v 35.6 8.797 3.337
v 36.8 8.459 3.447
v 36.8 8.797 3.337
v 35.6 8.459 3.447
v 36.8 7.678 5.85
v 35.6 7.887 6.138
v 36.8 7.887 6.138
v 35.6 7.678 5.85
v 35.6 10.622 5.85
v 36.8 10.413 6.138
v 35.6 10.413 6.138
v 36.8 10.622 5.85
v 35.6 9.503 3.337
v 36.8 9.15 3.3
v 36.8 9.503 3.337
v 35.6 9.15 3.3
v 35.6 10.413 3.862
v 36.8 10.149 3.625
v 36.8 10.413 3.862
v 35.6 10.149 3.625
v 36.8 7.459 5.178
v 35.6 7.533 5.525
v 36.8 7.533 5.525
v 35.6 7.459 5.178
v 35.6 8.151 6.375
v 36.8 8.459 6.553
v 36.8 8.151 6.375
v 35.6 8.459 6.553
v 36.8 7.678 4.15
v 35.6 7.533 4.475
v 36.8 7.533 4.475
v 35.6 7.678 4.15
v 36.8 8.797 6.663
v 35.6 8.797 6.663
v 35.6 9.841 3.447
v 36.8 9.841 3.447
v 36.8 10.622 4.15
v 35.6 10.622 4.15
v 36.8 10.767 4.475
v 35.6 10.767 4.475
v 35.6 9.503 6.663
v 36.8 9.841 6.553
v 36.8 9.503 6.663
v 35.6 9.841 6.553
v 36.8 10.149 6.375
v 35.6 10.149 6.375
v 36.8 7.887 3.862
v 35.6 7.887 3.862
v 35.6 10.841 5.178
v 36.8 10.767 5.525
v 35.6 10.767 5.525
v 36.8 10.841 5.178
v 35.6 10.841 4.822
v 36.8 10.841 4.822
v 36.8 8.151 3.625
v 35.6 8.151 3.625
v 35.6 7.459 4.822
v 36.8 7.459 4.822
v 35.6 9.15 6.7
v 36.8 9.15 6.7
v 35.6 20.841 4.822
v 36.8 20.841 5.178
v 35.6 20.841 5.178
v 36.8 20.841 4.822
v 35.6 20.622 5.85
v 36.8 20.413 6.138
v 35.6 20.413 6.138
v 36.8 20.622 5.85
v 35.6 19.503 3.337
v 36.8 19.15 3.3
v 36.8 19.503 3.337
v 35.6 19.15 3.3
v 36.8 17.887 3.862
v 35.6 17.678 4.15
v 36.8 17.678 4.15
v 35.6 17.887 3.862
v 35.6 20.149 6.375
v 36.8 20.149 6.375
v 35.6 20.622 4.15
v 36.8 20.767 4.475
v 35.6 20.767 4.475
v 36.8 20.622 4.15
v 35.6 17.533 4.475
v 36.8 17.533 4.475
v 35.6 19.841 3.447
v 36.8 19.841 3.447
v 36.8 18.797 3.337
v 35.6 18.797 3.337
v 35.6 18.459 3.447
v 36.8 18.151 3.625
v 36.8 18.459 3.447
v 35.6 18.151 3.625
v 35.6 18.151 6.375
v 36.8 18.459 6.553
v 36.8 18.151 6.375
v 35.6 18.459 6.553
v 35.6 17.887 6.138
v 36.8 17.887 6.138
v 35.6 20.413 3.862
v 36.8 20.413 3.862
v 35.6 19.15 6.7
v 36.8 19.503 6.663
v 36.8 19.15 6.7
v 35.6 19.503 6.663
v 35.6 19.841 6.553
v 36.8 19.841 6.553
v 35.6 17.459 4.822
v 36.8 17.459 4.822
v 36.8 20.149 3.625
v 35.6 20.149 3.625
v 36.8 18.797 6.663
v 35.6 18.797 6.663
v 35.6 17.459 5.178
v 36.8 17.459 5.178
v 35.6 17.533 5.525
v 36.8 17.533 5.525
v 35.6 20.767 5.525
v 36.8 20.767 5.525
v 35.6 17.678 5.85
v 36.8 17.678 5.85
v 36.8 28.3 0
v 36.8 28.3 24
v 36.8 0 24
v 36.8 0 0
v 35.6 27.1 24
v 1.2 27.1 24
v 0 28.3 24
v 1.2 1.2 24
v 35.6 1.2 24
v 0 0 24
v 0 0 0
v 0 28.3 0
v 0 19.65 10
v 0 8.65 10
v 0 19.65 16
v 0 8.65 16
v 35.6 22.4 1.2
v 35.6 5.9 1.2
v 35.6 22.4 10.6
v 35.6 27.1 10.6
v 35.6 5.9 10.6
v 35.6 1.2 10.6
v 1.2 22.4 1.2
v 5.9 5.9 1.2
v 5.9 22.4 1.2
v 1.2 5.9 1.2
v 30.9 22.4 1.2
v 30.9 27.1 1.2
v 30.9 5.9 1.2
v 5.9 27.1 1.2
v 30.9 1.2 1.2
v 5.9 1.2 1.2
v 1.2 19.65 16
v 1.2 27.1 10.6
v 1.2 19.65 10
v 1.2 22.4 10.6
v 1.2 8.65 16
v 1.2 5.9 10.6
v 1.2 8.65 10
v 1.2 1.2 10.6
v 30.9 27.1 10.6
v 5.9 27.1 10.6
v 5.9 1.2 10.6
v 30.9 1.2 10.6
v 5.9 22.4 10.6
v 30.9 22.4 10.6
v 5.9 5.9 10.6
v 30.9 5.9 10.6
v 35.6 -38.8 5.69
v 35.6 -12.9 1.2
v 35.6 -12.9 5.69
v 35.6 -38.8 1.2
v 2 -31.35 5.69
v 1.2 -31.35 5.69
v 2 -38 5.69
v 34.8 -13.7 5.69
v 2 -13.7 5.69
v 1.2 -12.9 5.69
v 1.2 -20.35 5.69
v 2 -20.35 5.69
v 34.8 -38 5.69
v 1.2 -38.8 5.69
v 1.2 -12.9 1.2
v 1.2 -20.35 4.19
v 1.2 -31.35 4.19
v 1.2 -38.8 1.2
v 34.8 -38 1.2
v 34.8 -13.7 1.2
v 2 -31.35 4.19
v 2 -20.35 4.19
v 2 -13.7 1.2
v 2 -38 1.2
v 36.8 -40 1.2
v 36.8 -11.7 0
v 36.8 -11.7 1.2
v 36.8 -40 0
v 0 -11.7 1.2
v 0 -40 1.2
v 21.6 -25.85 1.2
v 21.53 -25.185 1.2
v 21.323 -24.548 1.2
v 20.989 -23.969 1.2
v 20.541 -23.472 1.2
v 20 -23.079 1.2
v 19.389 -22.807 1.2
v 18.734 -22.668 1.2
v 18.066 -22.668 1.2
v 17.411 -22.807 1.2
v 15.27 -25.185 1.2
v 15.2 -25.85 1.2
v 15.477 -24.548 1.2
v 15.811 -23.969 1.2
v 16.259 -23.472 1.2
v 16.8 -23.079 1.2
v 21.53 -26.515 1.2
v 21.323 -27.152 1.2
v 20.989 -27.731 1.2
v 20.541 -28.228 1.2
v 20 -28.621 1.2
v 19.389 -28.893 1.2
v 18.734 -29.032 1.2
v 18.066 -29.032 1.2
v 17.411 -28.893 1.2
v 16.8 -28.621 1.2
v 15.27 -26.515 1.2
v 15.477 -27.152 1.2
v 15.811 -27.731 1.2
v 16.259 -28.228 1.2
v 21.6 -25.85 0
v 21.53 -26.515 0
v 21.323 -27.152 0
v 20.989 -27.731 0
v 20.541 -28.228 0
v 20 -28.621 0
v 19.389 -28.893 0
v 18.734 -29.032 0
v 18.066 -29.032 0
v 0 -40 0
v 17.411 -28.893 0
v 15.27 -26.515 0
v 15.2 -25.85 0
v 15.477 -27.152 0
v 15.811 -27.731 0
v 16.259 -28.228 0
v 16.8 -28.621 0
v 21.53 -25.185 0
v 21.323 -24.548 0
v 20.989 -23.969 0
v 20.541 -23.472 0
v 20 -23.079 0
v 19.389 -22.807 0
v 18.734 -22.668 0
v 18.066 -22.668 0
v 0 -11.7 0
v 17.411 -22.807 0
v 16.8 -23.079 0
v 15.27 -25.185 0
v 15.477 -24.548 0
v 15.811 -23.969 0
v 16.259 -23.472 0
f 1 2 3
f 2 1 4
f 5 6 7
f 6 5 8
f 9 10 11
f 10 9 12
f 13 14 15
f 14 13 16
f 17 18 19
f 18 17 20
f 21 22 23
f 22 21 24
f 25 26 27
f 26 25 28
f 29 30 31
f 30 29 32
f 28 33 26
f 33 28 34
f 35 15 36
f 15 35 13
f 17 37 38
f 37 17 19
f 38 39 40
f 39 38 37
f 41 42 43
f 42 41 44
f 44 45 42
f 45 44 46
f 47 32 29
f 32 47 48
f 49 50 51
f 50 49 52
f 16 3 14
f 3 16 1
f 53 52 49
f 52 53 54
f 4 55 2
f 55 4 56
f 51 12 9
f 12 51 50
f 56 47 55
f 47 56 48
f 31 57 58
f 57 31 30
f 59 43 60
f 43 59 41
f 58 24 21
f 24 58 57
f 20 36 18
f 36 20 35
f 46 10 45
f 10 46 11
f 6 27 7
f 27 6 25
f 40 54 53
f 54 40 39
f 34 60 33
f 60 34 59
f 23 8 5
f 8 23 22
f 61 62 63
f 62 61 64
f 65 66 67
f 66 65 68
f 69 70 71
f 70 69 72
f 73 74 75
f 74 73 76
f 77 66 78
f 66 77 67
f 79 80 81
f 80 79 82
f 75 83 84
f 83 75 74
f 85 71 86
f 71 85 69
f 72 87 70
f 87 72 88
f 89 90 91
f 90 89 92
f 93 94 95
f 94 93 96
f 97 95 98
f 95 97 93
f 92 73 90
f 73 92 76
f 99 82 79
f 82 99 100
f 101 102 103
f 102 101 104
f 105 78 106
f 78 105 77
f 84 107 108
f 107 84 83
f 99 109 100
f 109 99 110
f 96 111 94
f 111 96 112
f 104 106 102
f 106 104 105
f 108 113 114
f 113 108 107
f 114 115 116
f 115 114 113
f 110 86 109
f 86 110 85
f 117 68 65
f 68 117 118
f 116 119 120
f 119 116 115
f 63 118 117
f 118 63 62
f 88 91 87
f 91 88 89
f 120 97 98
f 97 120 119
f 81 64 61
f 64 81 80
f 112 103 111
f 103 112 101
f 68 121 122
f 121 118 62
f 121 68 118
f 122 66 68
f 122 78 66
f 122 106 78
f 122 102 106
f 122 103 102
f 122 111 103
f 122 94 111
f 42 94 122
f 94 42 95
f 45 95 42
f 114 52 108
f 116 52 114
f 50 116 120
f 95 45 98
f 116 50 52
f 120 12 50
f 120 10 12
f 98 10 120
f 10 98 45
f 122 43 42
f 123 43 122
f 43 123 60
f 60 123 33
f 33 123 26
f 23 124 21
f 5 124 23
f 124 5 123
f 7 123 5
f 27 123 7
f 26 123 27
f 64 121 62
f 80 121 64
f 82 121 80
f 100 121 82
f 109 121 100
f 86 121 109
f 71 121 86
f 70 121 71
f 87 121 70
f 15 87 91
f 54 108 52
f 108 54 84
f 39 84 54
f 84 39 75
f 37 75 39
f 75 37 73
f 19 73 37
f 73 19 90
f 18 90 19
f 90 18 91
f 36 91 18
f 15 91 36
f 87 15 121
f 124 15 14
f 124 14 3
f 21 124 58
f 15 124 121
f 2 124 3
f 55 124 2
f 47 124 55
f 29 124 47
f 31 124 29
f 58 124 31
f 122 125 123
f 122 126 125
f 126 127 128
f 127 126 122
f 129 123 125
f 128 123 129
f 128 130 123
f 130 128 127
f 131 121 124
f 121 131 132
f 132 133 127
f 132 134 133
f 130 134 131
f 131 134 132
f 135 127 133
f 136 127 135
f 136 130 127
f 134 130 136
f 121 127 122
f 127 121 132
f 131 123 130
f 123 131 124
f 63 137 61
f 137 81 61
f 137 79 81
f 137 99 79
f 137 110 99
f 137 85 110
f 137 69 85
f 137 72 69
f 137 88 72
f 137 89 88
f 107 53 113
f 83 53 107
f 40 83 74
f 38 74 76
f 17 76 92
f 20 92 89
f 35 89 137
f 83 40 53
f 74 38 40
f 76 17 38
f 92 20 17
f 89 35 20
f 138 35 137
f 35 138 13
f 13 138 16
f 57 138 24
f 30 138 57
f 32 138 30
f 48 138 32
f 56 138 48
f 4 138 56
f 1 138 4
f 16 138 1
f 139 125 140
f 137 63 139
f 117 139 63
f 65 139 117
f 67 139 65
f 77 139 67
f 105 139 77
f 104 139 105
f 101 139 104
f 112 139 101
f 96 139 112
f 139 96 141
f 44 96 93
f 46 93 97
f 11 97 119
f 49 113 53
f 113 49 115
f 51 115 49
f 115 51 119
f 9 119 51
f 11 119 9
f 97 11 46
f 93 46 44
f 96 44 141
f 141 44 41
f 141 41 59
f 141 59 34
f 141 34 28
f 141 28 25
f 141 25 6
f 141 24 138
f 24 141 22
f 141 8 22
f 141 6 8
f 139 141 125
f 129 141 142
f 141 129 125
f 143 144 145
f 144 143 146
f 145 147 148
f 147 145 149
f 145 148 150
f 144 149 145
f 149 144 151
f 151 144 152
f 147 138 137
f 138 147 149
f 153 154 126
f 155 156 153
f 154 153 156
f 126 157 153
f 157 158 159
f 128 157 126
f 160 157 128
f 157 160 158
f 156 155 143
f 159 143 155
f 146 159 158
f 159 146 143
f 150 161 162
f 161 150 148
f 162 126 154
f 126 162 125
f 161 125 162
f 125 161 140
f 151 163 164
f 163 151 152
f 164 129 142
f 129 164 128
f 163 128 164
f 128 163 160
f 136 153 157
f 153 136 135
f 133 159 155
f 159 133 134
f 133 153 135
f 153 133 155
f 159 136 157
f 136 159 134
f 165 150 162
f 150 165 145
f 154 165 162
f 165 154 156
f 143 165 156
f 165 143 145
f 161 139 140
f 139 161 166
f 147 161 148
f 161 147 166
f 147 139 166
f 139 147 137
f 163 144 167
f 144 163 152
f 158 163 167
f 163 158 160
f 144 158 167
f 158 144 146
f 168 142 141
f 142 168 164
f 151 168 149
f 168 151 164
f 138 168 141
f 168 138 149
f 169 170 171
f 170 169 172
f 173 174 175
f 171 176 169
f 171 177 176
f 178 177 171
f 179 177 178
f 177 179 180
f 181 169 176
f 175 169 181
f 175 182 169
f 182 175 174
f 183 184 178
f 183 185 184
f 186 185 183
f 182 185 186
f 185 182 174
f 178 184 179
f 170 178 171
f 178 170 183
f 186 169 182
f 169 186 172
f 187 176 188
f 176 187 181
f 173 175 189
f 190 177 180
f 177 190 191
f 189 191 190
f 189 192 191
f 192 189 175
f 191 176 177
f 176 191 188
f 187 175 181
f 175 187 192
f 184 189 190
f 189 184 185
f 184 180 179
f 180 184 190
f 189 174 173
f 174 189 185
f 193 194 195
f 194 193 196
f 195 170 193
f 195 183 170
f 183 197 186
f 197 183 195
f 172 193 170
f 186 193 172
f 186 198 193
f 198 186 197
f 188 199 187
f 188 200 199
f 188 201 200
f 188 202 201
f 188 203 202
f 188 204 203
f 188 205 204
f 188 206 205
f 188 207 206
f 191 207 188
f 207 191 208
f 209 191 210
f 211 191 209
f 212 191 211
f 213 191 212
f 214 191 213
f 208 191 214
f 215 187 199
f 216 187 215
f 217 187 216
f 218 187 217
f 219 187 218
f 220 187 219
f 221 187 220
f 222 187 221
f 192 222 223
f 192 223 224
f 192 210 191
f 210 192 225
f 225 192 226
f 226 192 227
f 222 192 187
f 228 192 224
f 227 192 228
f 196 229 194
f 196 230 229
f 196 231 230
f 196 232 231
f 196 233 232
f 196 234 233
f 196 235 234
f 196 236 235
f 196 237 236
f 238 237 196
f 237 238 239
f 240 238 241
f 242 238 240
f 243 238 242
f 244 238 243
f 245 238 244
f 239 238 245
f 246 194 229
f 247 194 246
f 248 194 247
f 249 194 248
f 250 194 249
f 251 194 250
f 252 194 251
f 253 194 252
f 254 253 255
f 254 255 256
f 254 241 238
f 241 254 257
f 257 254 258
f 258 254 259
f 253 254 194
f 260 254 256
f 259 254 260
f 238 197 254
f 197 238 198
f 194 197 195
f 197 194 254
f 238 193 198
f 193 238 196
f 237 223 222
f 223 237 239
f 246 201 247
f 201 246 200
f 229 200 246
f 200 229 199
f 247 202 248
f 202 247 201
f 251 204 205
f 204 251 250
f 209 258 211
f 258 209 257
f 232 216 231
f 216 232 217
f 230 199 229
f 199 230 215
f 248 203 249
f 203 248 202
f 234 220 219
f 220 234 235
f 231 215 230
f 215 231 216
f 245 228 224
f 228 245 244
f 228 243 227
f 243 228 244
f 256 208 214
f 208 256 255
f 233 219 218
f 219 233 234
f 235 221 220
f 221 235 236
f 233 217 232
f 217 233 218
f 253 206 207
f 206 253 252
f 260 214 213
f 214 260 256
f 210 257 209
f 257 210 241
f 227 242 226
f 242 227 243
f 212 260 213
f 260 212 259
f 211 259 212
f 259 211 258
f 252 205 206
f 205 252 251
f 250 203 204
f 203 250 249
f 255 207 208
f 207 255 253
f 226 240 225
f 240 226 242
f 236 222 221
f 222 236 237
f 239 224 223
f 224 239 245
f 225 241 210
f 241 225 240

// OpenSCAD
DEBUG = false;

pcb_size = [34.3, 25.8, 1.5];
height = 24;

antenna_conn_dia = 6.1;

space_around = 0;

pcb_hole_dia = 2.9;
pcb_hole_pos = 2;

fatness = 1.2;
inset = 0.2; // very small!

cover_fatness = 0.8;

inner_box = [pcb_size.x + 2 * space_around + inset / 2, pcb_size.y + 2 * space_around + inset / 2, height - fatness];
box = [inner_box.x + 2 * fatness, inner_box.y + 2 * fatness, inner_box.z + fatness];

echo("Inner box size ", inner_box.x, " x ", inner_box.y, " x ", inner_box.z);
echo("Box size ", box.x, " x ", box.y, " x ", box.z);

round_prec = 30;

usb_hole_size = [11, 6];
cable_hole_dia = 3.4;

column_hole_dia = 2;
column_hole_depth = 5 - pcb_size.z;
column_size = [pcb_hole_dia + 2, pcb_hole_dia + 2, 6 + column_hole_depth];

echo("Column size ", column_size.x, " x ", column_size.y, " x ", column_size.z);

// ---------------------------------------------

module Board(x, y, z) {
    translate([x, y, z]) union() {
        difference() {
            color("black") cube(pcb_size);
//            translate([pcb_hole_pos, pcb_hole_pos, - .01]) rotate([0, 0, 90])
//                cylinder(h = 10, d = pcb_hole_dia, $fn = round_prec);
//            translate([pcb_size.x - pcb_hole_pos, pcb_hole_pos, - .01]) rotate([0, 0, 90])
//                cylinder(h = 10, d = pcb_hole_dia, $fn = round_prec);
//            translate([pcb_size.x - pcb_hole_pos, pcb_size.y - pcb_hole_pos, - .01]) rotate([0, 0, 90])
//                cylinder(h = 10, d = pcb_hole_dia, $fn = round_prec);
//            translate([pcb_hole_pos, pcb_size.y - pcb_hole_pos, - .01]) rotate([0, 0, 90])
//                cylinder(h = 10, d = pcb_hole_dia, $fn = round_prec);
        }
//        color("gray") translate([4.5, 0, - 8]) difference() {
//            cube([37.5, pcb_size.y, 8]);
//            translate([- .01, 1.5, - .01]) cube([50, pcb_size.y - 2 * 1.5, 10]);
//        }
        usb_width = 7.7;
        color("red") translate([- 1, (pcb_size.y - usb_width) / 2, pcb_size.z]) cube([5, usb_width, 1]);
    }
}

module Column(x, y, z) {
    translate([x, y, z - .1]) {
        difference() {
            color("blue") cube(column_size);
//            color("red") translate([column_size.x / 2, column_size.y / 2, column_size.z - column_hole_depth]) {
//                cylinder(h = column_hole_depth + .01, d = column_hole_dia, $fn = round_prec);
//            }
        }
//        if (DEBUG) Screw(column_size.x / 2, column_size.y / 2, column_size.z + pcb_size.z);
    }
}

module Screw(x, y, z) {
    dia = 5.8;

    translate([x, y, z]) {
        color("red") cylinder(h = 1.5, d = dia, $fn = round_prec);
    }
}

// main box
union() {
    if (DEBUG) Board(fatness + space_around, fatness + space_around, fatness + column_size.z);

    difference() {
        cube([box.x, box.y, box.z]);

        // for debugging:
        // translate([fatness, - .01, fatness]) cube([inner_box.x, fatness + .02, inner_box.z]); // front

        translate([fatness, fatness, fatness])
            cube([inner_box.x, inner_box.y, box.z]);

        // usb hole
        translate([- 1, (box.y - usb_hole_size[0]) / 2, 10])
            cube([10, usb_hole_size[0], usb_hole_size[1]]);

        // holes for wires
        translate([box.x - fatness - .01, box.y / 2, 5]) {
            translate([0, - 5]) rotate([0, 90]) cylinder(h = fatness + .1, d = cable_hole_dia, $fn = round_prec);
            translate([0, 5]) rotate([0, 90]) cylinder(h = fatness + .1, d = cable_hole_dia, $fn = round_prec);
        }
    }

    /*TL*/Column(fatness + space_around - .2, box.y - space_around - fatness - column_size.y + .2, fatness);
    /*TR*/Column(box.x - space_around - fatness - column_size.x + .2, box.y - space_around - fatness - column_size.y + .2, fatness);
    /*BL*/Column(fatness + space_around - .2, fatness + space_around - .2, fatness);
    /*BR*/Column(box.x - space_around - fatness - column_size.x + .2, fatness + space_around - .2, fatness);
}

// cover
//translate([0, - 11.3, fatness + box.z + .1]) rotate([180, 0, 0])
translate([0, - 40, 0])
    difference() {
        union() {
            cube([box.x, box.y, fatness]);

            outer = [inner_box.x, inner_box.y, 4.5];
            echo("Cover outer size ", outer.x, " x ", outer.y, " x ", outer.z);
            translate([fatness, fatness, fatness - .01]) difference() {
                color("green") cube(outer);
                translate([cover_fatness, cover_fatness])
                    color("yellow") cube([outer.x - cover_fatness * 2, outer.y - cover_fatness * 2, outer.z + .01]);

                color("red") translate([-.01, (outer.y - usb_hole_size[0]) / 2, 3]) cube([10, usb_hole_size[0],
                    usb_hole_size[1]]);
            }
        }

        // hole for antenna
        translate([box.x / 2, box.y / 2, - .01]) {
            cylinder(h = 100, d = antenna_conn_dia + 0.3, $fn = round_prec);
        }
    }
